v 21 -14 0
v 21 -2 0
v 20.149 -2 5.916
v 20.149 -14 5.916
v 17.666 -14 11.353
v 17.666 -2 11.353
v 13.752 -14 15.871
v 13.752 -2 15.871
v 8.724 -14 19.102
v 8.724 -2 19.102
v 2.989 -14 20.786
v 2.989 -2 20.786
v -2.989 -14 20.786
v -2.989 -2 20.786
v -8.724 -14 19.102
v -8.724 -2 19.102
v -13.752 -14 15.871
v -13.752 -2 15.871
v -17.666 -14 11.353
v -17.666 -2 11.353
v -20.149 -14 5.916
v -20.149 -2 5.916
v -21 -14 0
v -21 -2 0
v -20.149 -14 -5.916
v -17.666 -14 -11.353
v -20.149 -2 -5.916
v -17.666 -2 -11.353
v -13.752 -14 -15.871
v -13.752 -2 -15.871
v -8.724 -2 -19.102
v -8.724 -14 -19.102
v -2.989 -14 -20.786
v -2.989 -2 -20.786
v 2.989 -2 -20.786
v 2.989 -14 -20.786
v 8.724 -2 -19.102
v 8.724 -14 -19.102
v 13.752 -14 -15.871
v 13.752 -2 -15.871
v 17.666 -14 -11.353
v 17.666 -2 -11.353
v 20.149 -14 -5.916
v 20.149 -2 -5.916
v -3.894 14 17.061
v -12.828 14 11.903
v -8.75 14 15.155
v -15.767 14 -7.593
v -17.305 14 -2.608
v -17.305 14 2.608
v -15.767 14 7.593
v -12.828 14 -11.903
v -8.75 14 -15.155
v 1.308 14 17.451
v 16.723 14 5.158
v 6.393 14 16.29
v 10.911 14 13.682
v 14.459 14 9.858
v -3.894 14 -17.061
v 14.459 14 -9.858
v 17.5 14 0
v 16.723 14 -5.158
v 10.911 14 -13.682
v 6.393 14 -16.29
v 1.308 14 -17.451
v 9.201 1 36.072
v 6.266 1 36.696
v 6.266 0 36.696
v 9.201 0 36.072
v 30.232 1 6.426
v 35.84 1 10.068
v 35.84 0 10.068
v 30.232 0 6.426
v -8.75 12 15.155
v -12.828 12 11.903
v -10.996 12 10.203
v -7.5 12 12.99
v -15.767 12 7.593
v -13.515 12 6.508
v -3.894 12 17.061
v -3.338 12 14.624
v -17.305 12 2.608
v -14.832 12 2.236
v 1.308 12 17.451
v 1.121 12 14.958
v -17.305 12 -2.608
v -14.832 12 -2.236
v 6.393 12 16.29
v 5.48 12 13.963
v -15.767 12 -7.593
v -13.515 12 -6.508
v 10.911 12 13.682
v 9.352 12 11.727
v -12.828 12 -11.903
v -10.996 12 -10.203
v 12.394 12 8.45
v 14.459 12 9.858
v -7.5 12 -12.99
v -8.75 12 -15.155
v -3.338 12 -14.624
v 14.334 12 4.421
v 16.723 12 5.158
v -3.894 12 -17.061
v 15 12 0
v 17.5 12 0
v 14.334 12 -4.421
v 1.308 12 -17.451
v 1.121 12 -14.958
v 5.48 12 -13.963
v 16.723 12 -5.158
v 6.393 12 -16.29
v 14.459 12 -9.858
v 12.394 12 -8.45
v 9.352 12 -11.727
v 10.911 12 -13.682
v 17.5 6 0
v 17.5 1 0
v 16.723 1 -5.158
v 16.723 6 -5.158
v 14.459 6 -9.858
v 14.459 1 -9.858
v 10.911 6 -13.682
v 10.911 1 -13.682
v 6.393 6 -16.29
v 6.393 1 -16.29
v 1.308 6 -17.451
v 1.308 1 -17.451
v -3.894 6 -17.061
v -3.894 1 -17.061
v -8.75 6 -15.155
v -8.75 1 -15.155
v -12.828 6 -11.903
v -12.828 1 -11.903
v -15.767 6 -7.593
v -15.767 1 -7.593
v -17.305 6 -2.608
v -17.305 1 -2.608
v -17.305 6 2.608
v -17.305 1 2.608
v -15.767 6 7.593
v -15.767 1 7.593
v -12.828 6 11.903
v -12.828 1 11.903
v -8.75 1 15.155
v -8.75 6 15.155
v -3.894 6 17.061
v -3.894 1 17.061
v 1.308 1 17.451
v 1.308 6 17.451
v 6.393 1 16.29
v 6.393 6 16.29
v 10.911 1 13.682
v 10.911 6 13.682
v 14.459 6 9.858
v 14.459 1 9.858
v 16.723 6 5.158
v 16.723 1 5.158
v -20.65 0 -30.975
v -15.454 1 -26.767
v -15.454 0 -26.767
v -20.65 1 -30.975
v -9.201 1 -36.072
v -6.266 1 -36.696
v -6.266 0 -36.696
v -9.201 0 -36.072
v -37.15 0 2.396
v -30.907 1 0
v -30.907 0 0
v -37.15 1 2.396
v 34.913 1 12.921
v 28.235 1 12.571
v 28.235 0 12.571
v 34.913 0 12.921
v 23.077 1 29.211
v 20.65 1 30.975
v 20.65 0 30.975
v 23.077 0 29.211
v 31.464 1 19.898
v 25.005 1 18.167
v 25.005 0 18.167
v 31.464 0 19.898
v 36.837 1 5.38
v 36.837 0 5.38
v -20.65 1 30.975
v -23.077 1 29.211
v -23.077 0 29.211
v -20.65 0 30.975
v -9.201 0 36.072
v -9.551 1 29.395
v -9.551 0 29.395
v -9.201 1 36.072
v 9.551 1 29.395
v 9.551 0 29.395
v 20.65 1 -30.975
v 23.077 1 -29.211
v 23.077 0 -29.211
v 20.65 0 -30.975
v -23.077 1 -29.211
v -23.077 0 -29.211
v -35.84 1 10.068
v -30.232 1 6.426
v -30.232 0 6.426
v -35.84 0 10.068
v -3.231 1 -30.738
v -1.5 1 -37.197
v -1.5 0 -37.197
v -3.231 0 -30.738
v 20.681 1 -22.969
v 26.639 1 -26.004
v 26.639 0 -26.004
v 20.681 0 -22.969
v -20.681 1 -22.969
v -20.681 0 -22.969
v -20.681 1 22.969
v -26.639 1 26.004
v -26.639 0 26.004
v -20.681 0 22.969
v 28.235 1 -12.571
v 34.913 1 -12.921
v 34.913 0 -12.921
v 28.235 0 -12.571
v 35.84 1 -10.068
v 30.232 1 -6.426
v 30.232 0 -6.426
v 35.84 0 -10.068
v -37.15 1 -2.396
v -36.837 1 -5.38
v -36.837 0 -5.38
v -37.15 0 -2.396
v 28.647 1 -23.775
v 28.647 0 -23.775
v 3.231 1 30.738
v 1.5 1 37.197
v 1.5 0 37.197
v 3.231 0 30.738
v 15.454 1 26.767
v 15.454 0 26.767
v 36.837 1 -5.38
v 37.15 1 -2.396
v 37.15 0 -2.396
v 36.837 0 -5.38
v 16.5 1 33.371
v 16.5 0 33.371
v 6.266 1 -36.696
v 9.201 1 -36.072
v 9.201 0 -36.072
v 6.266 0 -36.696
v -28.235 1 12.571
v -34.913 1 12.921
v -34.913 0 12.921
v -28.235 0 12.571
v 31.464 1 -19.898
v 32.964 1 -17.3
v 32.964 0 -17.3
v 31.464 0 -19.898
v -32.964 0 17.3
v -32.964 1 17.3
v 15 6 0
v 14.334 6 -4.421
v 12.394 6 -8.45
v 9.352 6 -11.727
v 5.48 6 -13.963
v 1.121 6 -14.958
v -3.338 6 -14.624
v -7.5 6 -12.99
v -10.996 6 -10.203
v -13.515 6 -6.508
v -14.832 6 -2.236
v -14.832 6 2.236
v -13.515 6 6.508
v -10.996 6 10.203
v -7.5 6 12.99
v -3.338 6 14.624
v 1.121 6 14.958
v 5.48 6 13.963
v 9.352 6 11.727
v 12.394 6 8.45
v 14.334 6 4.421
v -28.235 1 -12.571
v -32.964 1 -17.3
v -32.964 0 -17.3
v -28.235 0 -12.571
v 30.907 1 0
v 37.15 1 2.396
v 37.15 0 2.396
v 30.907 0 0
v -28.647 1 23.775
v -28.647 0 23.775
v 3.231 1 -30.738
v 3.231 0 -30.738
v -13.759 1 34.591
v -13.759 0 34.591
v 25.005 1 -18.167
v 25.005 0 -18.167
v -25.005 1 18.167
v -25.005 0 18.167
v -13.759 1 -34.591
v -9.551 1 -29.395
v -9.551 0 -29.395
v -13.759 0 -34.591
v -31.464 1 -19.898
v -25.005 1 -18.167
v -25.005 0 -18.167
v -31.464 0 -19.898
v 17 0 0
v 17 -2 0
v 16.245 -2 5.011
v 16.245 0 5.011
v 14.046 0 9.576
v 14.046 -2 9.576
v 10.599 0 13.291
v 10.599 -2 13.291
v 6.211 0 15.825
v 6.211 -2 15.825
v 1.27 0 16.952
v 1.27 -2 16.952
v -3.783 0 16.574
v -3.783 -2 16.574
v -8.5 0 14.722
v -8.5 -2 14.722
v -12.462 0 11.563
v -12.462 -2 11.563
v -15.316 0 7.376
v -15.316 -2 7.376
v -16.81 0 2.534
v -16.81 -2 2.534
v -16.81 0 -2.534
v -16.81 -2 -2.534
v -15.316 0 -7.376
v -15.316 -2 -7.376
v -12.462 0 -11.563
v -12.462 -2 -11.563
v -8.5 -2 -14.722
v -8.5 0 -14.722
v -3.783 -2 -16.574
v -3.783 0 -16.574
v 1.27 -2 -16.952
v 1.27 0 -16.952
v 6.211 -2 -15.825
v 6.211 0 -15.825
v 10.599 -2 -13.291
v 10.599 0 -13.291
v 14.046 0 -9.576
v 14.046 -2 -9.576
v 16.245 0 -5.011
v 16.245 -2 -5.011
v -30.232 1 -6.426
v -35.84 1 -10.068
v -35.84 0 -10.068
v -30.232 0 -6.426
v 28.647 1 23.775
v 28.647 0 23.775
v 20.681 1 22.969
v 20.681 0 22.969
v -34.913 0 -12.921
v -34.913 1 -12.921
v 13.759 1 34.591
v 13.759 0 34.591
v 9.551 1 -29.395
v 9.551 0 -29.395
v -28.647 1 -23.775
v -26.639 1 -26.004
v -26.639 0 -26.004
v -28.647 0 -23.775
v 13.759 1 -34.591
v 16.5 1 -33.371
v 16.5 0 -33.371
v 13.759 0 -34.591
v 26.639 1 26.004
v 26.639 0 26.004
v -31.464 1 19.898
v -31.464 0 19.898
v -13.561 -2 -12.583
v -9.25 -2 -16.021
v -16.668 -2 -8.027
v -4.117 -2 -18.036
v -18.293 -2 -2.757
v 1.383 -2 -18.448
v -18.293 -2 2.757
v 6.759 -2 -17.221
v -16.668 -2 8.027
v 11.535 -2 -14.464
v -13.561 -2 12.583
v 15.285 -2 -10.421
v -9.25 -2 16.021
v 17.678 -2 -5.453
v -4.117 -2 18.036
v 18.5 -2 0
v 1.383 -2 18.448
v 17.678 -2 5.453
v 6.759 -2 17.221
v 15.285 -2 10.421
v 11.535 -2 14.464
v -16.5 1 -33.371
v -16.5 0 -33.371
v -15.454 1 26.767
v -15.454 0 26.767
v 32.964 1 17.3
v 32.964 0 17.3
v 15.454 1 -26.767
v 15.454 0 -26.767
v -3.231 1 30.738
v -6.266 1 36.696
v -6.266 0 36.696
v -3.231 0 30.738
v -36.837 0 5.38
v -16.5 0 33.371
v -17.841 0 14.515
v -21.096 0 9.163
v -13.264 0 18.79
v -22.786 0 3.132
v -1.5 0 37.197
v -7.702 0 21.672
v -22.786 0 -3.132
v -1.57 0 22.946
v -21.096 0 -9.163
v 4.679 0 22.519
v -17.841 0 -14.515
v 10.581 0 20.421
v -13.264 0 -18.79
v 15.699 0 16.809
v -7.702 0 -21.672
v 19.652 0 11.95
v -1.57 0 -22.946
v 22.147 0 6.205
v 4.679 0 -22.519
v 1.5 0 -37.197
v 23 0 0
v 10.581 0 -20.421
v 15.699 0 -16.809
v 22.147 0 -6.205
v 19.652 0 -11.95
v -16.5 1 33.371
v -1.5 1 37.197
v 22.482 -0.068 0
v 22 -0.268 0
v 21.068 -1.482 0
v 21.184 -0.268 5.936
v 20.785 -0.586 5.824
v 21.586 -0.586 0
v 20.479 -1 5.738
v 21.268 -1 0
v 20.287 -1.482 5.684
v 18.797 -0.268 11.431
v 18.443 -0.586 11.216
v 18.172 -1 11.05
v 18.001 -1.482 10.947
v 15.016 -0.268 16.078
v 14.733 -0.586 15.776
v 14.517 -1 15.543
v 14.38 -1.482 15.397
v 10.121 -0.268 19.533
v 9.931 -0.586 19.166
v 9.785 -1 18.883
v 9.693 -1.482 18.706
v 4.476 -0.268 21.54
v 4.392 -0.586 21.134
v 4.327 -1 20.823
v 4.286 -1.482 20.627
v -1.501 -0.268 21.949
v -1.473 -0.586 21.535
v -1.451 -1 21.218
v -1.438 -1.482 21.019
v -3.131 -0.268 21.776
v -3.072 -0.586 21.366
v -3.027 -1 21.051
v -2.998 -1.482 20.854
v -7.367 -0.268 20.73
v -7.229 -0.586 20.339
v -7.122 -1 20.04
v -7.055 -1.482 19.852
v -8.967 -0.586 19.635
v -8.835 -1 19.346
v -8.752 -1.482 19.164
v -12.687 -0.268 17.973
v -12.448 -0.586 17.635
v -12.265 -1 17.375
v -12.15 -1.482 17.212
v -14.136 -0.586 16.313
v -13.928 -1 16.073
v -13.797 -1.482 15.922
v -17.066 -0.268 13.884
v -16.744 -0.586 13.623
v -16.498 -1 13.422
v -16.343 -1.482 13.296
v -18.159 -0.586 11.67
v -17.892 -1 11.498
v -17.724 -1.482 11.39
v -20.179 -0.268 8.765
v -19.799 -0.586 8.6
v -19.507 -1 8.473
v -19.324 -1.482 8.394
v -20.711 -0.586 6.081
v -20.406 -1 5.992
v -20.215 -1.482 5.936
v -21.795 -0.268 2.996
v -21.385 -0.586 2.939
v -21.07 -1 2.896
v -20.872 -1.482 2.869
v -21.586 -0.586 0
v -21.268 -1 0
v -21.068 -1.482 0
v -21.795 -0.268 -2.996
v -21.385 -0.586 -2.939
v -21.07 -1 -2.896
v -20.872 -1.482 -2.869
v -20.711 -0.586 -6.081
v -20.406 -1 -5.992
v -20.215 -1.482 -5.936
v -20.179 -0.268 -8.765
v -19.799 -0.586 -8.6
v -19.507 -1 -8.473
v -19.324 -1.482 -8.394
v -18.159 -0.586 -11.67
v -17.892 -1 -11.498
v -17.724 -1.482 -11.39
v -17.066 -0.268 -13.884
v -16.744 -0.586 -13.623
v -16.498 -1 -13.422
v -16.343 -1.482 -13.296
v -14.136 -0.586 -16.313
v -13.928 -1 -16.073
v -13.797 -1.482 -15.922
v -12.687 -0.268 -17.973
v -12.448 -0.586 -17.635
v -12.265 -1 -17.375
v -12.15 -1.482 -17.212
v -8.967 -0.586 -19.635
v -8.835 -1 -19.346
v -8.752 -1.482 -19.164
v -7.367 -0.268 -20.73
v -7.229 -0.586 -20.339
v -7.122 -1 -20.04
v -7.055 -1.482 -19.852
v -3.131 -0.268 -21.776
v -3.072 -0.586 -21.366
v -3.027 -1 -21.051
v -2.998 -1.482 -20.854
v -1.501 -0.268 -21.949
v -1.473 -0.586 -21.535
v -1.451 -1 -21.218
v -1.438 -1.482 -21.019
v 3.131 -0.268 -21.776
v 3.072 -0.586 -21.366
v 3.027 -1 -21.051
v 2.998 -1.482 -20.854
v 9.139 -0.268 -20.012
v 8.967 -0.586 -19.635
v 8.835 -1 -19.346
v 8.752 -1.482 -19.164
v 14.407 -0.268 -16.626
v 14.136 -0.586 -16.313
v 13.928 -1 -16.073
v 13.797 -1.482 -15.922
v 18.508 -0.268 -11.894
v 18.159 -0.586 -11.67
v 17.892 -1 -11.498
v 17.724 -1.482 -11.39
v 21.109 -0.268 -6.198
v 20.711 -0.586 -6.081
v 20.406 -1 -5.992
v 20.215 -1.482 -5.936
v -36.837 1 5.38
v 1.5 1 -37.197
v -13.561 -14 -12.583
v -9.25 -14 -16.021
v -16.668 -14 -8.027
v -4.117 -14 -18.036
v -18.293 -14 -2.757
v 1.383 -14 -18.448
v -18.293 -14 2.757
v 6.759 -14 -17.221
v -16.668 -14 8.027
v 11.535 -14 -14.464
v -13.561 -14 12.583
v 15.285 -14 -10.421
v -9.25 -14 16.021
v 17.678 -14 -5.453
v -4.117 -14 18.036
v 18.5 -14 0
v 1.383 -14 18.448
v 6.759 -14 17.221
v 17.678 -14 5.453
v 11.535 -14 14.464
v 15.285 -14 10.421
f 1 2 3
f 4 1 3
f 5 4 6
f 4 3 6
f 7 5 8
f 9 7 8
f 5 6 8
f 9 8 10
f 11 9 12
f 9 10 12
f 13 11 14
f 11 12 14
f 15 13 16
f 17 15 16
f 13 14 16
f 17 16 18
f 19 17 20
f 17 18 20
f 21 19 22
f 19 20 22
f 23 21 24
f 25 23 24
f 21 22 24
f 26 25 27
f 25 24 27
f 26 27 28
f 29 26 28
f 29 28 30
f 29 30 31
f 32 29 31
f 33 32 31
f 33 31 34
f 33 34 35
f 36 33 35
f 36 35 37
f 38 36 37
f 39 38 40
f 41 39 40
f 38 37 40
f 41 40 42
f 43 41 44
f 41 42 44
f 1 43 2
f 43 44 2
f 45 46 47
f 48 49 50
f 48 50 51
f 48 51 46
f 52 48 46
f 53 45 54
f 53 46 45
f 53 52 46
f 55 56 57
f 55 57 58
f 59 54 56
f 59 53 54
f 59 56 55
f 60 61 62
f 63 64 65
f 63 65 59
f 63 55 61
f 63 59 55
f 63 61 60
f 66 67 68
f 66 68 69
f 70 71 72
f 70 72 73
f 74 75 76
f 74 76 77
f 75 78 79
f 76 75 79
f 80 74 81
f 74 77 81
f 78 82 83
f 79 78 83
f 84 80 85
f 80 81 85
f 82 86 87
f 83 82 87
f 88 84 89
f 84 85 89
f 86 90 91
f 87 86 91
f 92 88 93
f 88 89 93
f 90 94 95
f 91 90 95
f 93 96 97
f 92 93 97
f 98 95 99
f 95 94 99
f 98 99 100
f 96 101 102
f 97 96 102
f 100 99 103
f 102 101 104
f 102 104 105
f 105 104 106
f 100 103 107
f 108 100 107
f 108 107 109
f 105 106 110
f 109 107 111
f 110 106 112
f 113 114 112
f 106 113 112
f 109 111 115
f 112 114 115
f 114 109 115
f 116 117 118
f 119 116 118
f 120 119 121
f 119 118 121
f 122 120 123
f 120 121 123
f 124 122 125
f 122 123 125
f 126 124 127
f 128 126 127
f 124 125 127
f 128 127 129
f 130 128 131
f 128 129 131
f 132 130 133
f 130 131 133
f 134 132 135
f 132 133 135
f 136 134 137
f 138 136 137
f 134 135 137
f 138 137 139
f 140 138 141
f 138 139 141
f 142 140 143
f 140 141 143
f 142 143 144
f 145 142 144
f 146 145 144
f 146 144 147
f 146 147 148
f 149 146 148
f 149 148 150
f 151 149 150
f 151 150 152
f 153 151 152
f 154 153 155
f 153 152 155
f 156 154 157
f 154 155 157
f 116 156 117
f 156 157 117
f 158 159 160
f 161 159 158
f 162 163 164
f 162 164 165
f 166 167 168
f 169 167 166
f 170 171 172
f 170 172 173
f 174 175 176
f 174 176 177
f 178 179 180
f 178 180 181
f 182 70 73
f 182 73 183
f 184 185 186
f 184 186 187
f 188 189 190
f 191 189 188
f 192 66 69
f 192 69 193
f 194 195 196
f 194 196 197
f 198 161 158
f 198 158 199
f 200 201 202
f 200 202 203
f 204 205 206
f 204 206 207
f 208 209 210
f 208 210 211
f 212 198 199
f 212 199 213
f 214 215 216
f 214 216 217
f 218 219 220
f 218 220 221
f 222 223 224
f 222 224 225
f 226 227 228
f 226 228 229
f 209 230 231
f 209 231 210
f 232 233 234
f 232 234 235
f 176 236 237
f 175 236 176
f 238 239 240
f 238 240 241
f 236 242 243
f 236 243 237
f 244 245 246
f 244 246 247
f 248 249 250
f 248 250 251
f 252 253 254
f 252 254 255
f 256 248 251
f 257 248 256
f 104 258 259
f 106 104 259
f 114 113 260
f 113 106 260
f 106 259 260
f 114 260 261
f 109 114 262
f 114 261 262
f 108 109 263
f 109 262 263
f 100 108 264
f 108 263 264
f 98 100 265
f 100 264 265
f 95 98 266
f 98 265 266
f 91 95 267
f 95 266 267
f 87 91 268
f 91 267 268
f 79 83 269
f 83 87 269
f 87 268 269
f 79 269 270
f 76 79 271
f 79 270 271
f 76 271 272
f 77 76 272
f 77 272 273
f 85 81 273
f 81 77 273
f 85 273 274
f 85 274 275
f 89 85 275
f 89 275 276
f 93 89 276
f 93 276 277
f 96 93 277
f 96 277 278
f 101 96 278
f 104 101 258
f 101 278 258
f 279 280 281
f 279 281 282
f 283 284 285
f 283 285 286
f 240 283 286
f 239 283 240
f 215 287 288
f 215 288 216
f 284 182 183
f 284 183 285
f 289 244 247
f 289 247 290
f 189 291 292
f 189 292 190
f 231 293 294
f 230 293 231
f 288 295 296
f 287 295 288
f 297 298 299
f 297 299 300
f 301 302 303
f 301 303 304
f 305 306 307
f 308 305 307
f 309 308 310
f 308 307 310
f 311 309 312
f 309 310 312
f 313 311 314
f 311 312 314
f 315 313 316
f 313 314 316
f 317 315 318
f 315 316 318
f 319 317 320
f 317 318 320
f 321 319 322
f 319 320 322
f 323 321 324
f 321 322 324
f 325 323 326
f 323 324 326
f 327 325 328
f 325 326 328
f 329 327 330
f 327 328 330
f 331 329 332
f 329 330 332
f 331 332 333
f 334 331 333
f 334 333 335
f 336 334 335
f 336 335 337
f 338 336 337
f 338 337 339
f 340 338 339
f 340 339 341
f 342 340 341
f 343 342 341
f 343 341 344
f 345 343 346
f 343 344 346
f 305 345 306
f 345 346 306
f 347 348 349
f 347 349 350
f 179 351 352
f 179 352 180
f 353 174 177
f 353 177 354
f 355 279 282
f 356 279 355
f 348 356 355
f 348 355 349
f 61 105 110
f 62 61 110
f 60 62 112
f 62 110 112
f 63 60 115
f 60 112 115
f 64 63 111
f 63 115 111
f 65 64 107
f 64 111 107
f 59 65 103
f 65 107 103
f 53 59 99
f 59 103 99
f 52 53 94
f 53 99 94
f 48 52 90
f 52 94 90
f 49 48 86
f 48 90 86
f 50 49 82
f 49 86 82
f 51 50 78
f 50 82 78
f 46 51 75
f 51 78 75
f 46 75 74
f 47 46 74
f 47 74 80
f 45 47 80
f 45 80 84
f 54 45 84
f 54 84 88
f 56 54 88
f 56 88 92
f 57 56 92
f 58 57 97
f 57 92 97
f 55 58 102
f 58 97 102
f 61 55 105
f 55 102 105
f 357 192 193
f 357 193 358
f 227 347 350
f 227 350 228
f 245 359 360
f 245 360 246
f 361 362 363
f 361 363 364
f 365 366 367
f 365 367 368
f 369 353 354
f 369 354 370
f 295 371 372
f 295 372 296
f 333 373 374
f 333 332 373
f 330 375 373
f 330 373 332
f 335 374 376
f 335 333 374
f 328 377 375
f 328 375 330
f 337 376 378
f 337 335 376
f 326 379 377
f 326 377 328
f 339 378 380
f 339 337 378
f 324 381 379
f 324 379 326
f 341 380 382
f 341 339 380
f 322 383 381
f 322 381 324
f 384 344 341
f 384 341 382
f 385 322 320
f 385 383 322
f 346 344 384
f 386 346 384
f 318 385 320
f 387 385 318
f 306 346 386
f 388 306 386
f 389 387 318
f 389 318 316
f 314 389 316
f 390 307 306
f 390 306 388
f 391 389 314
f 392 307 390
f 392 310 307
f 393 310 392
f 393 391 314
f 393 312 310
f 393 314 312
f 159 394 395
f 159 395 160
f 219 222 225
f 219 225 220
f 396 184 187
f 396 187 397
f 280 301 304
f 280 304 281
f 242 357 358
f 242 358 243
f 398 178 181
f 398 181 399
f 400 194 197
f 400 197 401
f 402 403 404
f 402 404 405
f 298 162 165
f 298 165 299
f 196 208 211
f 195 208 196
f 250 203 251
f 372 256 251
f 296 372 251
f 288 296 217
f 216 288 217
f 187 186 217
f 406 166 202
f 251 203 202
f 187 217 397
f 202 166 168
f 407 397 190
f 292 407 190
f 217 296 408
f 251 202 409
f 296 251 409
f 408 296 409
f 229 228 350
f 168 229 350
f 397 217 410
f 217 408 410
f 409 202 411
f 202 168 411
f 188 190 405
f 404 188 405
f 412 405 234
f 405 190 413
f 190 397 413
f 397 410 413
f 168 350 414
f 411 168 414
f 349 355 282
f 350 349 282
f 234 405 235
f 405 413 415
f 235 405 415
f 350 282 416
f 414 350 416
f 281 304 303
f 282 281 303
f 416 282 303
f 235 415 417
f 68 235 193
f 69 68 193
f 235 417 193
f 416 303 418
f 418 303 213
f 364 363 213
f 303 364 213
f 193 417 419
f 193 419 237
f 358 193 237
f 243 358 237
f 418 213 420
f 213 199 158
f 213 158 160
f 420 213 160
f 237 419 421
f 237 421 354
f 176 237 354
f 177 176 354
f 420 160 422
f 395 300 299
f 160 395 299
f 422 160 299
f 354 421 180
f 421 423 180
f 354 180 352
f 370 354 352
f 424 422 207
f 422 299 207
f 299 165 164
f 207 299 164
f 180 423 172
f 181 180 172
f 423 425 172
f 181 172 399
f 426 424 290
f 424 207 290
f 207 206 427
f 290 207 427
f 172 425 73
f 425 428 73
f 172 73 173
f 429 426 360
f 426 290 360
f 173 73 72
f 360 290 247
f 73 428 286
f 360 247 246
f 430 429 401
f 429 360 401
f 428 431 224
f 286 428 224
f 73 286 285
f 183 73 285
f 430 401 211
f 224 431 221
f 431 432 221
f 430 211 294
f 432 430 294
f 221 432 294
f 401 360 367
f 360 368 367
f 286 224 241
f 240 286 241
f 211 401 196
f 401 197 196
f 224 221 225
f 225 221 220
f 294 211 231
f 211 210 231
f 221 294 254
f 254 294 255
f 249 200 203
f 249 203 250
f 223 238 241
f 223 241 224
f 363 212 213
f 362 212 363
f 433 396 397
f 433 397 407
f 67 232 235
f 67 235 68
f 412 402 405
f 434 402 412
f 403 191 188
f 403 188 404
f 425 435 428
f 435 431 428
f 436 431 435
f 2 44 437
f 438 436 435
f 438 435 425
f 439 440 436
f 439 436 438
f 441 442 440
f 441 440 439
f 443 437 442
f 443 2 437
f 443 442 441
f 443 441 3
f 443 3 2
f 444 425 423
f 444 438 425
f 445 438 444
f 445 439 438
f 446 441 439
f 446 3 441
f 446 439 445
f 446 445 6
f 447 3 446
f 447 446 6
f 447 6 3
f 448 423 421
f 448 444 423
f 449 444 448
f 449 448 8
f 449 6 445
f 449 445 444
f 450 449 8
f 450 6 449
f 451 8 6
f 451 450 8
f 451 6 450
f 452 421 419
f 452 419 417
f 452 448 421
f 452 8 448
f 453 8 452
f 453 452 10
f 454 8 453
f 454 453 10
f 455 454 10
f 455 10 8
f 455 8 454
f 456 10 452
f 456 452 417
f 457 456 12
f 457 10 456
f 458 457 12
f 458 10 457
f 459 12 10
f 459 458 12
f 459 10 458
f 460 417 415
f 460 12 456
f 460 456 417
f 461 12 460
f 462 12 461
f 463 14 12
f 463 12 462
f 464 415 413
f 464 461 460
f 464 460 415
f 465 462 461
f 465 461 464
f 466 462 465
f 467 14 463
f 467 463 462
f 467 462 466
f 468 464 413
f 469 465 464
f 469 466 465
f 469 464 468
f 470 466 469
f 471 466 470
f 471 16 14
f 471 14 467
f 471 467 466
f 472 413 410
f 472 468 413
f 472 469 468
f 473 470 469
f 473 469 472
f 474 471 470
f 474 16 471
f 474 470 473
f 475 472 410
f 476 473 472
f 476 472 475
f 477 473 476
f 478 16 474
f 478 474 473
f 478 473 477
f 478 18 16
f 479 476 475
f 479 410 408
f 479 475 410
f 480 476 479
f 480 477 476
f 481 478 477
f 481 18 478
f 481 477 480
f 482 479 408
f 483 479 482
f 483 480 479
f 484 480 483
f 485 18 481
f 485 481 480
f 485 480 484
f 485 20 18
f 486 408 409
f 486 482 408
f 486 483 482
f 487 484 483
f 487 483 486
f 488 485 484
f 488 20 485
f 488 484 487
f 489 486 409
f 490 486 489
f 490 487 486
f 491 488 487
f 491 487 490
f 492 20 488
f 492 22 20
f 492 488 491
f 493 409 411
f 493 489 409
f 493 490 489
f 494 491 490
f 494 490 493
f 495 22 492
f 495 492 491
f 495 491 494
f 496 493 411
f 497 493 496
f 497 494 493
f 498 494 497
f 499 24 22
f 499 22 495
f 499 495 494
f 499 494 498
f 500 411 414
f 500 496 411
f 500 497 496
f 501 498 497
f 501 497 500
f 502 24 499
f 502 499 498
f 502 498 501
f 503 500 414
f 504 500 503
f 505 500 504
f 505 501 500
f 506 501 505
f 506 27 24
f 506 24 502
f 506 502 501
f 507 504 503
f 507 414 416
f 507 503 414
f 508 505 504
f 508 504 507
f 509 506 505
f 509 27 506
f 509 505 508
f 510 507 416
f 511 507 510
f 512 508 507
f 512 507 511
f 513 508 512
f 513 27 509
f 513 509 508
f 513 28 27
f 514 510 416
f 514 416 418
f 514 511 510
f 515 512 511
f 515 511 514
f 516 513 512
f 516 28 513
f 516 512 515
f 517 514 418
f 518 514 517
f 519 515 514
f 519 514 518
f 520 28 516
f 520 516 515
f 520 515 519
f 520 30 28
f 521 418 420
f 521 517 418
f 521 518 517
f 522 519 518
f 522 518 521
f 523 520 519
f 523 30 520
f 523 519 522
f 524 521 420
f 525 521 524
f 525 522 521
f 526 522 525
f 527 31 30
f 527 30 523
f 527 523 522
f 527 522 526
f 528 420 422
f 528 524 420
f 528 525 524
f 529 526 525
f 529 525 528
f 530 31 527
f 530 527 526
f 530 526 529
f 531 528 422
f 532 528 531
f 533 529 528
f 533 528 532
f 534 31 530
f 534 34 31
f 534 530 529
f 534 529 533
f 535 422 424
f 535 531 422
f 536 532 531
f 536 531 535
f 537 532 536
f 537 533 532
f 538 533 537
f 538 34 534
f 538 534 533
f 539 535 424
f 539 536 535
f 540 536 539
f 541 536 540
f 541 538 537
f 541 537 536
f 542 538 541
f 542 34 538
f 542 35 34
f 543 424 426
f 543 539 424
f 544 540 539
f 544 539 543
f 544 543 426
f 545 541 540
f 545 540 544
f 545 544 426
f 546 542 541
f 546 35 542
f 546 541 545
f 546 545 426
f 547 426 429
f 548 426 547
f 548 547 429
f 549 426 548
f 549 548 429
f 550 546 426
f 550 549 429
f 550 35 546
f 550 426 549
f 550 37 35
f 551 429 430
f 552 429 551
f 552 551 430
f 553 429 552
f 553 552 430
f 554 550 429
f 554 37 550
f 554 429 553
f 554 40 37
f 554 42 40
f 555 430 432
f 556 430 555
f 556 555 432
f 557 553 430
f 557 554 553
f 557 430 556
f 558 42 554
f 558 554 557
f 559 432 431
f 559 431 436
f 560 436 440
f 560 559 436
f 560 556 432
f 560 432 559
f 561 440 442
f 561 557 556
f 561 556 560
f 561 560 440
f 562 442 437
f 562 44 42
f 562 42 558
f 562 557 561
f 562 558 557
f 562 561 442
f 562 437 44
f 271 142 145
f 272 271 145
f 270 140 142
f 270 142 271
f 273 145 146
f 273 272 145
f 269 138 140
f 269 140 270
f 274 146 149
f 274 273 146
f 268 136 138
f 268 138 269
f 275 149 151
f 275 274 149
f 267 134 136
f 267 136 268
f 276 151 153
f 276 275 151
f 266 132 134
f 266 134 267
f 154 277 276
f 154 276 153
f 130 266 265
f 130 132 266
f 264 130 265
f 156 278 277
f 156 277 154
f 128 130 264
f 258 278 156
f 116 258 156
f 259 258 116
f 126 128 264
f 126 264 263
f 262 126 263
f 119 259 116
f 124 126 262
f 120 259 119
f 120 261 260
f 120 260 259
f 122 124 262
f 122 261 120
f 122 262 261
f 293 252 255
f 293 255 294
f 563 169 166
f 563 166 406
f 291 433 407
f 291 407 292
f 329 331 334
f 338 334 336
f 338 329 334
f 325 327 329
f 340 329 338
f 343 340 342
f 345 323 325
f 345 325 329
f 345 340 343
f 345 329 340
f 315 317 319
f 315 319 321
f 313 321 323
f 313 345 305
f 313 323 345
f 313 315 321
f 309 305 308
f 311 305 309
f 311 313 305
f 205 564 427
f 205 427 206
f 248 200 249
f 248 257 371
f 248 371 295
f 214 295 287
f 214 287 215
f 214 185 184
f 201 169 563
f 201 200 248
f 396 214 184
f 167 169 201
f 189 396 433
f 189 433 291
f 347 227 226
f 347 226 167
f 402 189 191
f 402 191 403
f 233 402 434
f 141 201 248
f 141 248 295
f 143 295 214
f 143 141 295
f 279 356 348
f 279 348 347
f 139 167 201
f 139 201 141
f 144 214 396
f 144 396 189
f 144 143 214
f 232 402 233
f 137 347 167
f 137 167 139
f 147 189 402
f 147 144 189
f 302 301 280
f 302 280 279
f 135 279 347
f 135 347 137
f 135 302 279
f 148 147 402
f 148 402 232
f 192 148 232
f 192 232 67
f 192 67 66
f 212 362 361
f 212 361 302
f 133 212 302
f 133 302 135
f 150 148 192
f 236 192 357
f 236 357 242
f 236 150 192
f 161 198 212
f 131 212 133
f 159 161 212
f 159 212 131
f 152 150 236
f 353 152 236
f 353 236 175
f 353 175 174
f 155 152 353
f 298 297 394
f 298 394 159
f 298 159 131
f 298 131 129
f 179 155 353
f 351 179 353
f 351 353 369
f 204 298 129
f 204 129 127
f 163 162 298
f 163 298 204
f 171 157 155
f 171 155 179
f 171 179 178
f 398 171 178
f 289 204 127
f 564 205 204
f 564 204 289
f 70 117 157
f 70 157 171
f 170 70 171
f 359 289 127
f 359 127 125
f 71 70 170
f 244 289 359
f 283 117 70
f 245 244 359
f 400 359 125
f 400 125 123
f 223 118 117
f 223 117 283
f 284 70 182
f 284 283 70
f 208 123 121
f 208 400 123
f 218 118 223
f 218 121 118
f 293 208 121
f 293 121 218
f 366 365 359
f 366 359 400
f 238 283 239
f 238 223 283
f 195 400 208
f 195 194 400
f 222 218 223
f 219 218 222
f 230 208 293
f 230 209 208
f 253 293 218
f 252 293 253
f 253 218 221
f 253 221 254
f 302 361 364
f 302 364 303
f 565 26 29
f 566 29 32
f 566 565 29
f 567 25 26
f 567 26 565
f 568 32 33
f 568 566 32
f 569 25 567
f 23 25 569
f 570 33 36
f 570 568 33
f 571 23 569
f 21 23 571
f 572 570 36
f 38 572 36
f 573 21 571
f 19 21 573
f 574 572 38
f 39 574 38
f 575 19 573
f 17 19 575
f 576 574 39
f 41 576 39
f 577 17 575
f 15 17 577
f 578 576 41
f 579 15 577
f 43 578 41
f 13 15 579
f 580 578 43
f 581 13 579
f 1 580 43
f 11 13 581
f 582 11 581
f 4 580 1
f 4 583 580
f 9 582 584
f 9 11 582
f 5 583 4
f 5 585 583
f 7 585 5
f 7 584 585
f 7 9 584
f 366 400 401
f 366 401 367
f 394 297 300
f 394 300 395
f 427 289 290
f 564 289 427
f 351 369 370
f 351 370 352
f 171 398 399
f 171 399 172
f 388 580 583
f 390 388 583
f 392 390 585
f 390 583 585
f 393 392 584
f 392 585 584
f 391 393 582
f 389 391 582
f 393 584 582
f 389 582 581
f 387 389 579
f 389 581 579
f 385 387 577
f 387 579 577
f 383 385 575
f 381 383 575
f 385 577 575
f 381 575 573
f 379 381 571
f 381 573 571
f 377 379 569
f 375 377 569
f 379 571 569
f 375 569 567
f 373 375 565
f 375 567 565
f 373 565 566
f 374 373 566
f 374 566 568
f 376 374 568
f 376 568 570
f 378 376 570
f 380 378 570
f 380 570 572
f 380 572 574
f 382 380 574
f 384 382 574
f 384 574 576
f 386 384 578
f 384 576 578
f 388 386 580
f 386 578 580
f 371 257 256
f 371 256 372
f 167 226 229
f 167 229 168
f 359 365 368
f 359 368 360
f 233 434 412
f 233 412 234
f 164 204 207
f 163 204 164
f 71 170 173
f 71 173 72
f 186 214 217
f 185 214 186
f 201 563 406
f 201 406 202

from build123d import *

# Parameters (mm, degrees)
SKETCH1_R                        = 30
TANDHJUL_MAINBODY_DEPTH          = 1
SKETCH2_R                        = 15
TANDHJUL_FISKELINIE_DEPTH        = 20
SKETCH3_R                        = 17.5
TANDHJUL_FISKELINIESTOPPER_DEPTH = 1
T_NDER_DEPTH                     = 1
T_NDERPATTERN_COUNT              = 30
SKETCH11_R                       = 17.5
BOSS_EXTRUDE1_DEPTH              = 5
SKETCH12_R                       = 21
BOSS_EXTRUDE2_DEPTH              = 14
FILLET1_R                        = 2
SKETCH13_R                       = 18.5
CUT_EXTRUDE1_DEPTH               = 12
SKETCH14_R                       = 17
CUT_EXTRUDE2_DEPTH               = 2
SKETCH15_R                       = 23.679719335
CUT_EXTRUDE3_DEPTH               = 10
SKETCH18_R                       = 17.5
BOSS_EXTRUDE3_DEPTH              = 2


with BuildPart() as part:
    # Sketch1 → Tandhjul mainBody (new body)
    with BuildSketch(Plane(origin=(0, 0, 0), x_dir=(1, 0, 0), z_dir=(0, 1, 0))):
        Circle(SKETCH1_R)
    extrude(amount=TANDHJUL_MAINBODY_DEPTH)

    # Sketch2 → Tandhjul fiskelinie (add)
    with BuildSketch(Plane(origin=(0, 1, 0), x_dir=(1, 0, 0), z_dir=(0, 1, 0))):
        Circle(SKETCH2_R)
    extrude(amount=TANDHJUL_FISKELINIE_DEPTH)

    # Sketch3 → Tandhjul fiskelinieStopper (add)
    with BuildSketch(Plane(origin=(0, 21, 0), x_dir=(1, 0, 0), z_dir=(0, 1, 0))):
        Circle(SKETCH3_R)
    extrude(amount=TANDHJUL_FISKELINIESTOPPER_DEPTH)

    # Sketch9 → Tænder (add)
    with BuildSketch(Plane(origin=(0, 1, 0), x_dir=(1, 0, 0), z_dir=(0, 1, 0))):
        Polygon((-1.5, 37.197102186), (-5.038144939, 23.992565508), (0, 23.992565508), (5.038144939, 23.992565508), (1.5, 37.197102186), align=None)
    t_nder = extrude(amount=-T_NDER_DEPTH)

    # TænderPattern: Tænder ×30 about axis
    t_nderpattern_axis = Axis((0, 0, 0), (0, 1, 0))
    for i in range(1, T_NDERPATTERN_COUNT):
        add(t_nder.rotate(t_nderpattern_axis, i * 360 / T_NDERPATTERN_COUNT))

    # Sketch11 → Boss-Extrude1 (add)
    with BuildSketch(Plane(origin=(0, 1, 0), x_dir=(1, 0, 0), z_dir=(0, 1, 0))):
        Circle(SKETCH11_R)
    extrude(amount=BOSS_EXTRUDE1_DEPTH)

    # Sketch12 → Boss-Extrude2 (add)
    with BuildSketch(Plane.XZ):
        Circle(SKETCH12_R)
    extrude(amount=BOSS_EXTRUDE2_DEPTH)

    # Fillet1
    fillet1_edges = [part.edges().sort_by_distance(p)[0] for p in [
        (-21, 0, 0),
    ]]
    fillet(fillet1_edges, radius=FILLET1_R)

    # Sketch13 → Cut-Extrude1 (cut)
    with BuildSketch(Plane.XZ.offset(14)):
        Circle(SKETCH13_R)
    extrude(amount=-CUT_EXTRUDE1_DEPTH, mode=Mode.SUBTRACT)

    # Sketch14 → Cut-Extrude2 (cut)
    with BuildSketch(Plane.XZ.offset(2)):
        Circle(SKETCH14_R)
    extrude(amount=-CUT_EXTRUDE2_DEPTH, mode=Mode.SUBTRACT)

    # Sketch15 → Cut-Extrude3 (cut)
    with BuildSketch(Plane(origin=(0, 22, 0), x_dir=(1, 0, 0), z_dir=(0, 1, 0))):
        with Locations((-1.024461649, -1.098868056)):
            Circle(SKETCH15_R)
    extrude(amount=-CUT_EXTRUDE3_DEPTH, mode=Mode.SUBTRACT)

    # Sketch18 → Boss-Extrude3 (add)
    with BuildSketch(Plane(origin=(0, 12, 0), x_dir=(1, 0, 0), z_dir=(0, 1, 0))):
        Circle(SKETCH18_R)
    extrude(amount=BOSS_EXTRUDE3_DEPTH)


solid = part.part
